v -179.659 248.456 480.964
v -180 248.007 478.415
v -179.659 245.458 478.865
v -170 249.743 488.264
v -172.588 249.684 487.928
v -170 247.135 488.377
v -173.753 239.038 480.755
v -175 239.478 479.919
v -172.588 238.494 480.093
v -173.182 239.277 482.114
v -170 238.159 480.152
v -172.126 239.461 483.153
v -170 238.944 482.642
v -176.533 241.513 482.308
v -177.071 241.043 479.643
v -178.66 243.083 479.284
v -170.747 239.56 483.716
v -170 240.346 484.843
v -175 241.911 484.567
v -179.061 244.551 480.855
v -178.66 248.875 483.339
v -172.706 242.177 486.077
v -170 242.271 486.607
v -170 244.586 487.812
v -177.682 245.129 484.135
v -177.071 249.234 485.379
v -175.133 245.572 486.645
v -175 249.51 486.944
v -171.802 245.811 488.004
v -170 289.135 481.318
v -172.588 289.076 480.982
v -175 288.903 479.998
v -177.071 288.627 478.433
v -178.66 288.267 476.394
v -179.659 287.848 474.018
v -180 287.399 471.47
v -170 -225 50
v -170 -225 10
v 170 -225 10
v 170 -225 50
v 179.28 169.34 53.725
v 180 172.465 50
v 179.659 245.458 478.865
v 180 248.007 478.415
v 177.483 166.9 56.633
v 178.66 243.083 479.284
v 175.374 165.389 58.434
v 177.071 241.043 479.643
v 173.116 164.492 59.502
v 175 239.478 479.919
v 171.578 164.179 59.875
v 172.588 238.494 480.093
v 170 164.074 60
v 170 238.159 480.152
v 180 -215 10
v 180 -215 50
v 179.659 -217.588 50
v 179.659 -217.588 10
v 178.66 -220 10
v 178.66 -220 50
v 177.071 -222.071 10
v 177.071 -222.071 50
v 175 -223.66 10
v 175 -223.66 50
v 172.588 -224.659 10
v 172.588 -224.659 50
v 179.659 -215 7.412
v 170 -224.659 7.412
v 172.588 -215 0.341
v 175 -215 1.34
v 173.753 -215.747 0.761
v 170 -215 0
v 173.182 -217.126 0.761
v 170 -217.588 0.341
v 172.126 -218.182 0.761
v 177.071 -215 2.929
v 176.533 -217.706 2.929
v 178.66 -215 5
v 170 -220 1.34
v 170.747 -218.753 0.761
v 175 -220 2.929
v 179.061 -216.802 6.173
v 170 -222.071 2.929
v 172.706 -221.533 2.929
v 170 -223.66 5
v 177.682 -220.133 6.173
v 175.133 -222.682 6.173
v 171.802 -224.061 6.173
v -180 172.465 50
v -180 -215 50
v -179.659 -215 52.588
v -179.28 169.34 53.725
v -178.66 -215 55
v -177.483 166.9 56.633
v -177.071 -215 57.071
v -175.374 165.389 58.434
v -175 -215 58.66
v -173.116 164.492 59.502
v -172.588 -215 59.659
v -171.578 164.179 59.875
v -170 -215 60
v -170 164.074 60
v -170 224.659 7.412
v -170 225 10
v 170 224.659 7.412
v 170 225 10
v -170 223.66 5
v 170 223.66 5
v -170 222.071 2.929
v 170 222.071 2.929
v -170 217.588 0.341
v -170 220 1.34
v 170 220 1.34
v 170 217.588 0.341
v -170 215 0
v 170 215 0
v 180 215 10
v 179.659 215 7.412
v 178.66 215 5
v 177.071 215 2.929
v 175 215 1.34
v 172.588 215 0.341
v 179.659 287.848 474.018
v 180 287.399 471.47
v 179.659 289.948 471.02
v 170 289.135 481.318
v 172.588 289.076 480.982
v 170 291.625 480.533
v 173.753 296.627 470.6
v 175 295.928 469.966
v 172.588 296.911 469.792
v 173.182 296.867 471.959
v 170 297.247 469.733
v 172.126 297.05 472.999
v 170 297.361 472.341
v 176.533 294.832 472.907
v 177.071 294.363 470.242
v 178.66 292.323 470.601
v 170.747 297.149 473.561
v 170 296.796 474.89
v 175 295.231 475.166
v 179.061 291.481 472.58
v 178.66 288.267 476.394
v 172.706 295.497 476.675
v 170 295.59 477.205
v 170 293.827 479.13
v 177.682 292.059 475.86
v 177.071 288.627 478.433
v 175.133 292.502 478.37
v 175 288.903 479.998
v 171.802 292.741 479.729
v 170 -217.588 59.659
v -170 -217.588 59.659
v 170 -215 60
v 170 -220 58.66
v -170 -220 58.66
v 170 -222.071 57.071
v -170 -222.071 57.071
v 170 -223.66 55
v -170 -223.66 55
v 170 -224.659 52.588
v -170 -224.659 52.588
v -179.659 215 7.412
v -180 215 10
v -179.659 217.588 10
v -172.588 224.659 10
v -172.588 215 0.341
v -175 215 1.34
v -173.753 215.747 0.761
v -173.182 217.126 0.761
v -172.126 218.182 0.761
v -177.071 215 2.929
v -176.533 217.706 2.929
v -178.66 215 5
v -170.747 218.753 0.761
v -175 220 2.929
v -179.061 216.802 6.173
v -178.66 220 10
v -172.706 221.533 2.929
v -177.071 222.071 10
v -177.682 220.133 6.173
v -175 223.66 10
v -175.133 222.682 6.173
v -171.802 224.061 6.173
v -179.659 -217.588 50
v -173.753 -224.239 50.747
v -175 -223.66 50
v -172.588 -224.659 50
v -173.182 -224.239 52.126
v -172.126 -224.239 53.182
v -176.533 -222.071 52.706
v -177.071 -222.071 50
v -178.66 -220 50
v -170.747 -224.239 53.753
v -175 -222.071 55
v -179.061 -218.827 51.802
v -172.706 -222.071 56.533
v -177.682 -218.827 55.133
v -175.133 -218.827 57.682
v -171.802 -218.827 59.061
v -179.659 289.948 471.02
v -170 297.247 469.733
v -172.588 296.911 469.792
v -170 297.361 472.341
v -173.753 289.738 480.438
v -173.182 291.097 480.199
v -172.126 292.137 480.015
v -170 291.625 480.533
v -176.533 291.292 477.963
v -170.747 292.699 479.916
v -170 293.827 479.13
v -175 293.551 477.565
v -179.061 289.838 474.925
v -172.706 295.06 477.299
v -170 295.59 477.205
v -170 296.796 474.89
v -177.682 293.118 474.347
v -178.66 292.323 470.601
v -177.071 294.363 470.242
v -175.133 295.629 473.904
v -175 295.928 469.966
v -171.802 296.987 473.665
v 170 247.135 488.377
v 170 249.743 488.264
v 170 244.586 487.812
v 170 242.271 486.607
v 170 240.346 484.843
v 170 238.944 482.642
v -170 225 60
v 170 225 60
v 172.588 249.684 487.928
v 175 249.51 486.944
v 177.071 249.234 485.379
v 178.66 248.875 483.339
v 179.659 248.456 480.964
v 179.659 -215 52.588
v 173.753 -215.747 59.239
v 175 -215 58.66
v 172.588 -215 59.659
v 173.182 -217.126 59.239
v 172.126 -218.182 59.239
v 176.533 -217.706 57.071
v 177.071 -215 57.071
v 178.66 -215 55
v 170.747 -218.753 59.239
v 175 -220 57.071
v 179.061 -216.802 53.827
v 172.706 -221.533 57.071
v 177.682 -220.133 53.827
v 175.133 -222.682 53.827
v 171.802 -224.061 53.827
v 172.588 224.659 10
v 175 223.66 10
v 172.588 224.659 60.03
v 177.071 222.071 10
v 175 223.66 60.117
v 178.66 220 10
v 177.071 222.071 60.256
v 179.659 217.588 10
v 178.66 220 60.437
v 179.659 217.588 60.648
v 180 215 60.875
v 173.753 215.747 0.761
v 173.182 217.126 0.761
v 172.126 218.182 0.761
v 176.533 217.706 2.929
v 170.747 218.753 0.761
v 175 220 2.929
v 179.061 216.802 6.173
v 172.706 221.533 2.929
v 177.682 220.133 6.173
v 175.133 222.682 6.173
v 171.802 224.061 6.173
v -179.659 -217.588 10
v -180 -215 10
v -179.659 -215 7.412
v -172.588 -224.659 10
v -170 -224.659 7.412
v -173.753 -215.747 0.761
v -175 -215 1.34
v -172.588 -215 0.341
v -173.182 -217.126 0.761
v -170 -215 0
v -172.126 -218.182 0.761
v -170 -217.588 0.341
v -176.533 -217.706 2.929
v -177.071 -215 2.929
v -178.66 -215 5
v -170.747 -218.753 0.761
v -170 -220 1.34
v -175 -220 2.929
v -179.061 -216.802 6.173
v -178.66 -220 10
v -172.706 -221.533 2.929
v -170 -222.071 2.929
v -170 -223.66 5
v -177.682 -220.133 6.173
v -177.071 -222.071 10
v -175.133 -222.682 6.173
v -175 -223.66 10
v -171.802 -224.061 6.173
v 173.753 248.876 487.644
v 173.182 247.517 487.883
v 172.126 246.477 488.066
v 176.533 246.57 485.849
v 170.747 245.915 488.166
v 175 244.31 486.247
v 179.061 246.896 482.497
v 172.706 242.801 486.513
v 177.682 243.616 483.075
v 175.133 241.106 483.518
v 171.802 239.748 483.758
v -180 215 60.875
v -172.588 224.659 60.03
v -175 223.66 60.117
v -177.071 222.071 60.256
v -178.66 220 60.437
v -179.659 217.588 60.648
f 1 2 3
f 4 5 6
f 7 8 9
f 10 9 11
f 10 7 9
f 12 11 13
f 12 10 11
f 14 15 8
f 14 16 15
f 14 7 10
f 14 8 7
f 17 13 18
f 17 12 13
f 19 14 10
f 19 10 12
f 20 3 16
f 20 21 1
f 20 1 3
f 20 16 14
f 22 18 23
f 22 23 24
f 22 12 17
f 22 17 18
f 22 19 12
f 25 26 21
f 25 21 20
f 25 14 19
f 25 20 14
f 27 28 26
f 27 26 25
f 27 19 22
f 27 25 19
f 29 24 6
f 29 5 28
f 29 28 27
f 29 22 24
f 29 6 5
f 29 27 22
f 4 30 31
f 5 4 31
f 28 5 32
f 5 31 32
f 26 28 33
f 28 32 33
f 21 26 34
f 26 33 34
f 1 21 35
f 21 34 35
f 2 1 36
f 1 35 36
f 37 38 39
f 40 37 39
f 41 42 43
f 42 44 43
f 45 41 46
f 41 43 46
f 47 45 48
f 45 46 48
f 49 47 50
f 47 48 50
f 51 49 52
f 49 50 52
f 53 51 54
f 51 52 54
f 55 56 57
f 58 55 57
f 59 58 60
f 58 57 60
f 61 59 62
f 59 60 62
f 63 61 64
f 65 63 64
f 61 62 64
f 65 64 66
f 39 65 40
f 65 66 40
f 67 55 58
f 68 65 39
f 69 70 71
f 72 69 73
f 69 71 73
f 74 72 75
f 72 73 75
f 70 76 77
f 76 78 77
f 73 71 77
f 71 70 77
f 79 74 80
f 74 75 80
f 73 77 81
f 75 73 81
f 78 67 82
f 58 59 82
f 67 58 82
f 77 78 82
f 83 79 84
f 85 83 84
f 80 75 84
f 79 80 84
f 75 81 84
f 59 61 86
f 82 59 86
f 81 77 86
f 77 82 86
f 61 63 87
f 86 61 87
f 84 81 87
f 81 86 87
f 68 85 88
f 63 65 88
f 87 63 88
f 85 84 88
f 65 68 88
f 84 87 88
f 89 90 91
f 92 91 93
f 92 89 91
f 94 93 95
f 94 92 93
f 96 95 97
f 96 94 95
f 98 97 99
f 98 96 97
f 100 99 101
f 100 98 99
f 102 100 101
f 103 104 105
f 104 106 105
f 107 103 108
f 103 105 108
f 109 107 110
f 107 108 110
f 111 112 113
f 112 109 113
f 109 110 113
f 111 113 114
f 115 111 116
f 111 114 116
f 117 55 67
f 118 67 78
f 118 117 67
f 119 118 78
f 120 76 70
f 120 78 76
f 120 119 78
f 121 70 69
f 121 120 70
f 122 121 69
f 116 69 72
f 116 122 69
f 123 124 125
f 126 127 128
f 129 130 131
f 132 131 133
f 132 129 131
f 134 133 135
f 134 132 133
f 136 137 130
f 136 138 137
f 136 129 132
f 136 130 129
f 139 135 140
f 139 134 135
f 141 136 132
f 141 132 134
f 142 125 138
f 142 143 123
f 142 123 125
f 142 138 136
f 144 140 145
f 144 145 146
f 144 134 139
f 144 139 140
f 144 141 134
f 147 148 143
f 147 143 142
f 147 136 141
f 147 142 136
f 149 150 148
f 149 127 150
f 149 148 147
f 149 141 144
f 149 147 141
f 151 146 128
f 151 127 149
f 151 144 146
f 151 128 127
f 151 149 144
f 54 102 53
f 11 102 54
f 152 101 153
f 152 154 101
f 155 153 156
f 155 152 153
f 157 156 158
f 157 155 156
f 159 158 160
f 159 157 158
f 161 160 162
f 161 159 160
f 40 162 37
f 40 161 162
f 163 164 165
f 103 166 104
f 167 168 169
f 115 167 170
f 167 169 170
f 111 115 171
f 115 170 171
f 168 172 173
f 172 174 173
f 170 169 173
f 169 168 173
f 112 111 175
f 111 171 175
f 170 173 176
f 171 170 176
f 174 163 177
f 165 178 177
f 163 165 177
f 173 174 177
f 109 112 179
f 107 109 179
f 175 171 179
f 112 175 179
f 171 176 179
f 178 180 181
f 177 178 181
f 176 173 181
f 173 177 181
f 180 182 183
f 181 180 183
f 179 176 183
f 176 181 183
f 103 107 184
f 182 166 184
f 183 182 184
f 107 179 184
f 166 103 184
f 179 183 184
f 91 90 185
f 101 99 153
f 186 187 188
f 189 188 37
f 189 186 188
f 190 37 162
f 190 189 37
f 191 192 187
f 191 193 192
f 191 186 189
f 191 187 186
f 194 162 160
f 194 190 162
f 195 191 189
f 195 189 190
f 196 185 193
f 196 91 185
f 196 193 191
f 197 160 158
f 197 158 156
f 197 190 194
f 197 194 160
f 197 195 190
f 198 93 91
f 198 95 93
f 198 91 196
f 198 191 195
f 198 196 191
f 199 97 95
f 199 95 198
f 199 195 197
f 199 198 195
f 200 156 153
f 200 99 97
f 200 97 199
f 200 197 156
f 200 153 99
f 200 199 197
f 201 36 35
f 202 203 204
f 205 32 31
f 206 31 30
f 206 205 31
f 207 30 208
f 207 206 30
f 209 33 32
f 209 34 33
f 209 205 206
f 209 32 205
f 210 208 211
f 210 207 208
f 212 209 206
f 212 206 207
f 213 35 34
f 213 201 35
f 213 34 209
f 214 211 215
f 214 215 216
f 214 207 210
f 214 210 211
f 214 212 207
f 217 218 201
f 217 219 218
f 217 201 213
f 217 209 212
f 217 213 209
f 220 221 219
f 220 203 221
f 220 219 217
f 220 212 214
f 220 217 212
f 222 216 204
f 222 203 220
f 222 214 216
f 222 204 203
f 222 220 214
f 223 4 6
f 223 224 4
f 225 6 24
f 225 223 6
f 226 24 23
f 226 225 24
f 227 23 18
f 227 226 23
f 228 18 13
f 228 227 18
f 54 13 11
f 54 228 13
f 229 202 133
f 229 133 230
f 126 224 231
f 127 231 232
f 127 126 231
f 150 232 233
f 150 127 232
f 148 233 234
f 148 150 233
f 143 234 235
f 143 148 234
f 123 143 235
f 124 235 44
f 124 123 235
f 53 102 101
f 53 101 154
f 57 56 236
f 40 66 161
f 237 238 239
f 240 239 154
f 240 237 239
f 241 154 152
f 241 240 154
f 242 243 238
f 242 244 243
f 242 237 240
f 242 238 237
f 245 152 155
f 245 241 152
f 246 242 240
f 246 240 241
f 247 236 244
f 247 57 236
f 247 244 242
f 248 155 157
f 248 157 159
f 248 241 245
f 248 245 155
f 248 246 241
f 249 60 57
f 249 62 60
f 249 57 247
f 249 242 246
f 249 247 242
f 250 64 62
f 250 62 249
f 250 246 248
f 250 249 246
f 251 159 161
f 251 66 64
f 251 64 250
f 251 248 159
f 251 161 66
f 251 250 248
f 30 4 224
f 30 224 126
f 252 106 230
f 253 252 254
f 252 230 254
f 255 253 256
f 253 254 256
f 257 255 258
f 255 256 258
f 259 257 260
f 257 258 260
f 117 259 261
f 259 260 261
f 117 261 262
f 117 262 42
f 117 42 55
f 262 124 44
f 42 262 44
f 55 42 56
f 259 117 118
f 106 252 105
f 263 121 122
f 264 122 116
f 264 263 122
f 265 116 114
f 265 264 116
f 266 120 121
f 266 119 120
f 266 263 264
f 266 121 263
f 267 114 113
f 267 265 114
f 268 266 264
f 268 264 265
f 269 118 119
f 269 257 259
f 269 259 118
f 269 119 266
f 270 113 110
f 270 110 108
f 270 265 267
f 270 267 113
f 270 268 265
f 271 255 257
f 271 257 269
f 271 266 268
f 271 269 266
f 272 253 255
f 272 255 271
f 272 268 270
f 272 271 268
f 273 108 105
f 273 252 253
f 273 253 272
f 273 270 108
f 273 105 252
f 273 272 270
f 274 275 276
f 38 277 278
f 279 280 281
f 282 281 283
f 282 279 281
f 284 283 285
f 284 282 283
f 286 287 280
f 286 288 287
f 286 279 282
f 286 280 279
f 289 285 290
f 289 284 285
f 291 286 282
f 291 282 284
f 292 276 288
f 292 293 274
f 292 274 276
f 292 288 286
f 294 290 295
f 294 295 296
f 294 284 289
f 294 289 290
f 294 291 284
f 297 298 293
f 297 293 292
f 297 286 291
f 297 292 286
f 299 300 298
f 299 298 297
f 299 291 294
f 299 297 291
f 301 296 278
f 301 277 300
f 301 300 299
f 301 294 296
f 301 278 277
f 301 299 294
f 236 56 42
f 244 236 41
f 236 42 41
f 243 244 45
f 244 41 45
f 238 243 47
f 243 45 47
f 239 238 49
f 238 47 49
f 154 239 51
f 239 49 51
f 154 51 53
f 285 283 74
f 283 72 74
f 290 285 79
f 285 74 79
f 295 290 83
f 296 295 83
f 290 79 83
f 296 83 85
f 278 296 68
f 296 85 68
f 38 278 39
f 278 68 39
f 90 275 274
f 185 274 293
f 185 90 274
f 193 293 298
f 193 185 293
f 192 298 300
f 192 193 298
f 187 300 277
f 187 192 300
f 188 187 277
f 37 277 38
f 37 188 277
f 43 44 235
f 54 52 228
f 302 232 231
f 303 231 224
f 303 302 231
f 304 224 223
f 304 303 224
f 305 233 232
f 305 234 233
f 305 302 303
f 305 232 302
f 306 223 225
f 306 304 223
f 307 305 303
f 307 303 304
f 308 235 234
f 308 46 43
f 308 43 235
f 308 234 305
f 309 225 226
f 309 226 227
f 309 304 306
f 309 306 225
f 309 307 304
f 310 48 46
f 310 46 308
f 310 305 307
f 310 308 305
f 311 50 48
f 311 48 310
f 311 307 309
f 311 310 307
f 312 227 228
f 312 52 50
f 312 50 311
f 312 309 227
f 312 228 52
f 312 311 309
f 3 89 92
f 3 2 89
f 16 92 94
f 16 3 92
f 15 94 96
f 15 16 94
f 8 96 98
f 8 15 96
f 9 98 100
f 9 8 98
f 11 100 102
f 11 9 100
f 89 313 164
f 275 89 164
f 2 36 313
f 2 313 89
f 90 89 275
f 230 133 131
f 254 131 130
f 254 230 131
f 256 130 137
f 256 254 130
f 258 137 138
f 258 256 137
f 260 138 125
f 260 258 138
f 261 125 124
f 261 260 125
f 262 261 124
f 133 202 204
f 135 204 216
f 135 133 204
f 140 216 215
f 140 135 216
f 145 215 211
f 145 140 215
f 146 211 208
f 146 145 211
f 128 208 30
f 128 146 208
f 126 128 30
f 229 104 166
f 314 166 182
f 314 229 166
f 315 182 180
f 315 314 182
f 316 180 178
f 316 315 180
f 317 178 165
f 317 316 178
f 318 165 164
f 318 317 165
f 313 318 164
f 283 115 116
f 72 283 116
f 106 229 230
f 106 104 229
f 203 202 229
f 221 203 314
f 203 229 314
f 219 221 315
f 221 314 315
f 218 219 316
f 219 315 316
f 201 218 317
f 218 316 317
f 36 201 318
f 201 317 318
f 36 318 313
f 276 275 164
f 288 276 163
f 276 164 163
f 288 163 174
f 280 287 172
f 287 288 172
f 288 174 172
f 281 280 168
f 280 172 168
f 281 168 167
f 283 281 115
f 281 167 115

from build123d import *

# Parameters (mm, degrees)
F0_W     = 360
F0_H     = 450
F1_DEPTH = 60
F3_DEPTH = 360
F4_R     = 10


with BuildPart() as f1:
    # F0 (on Top) → F1 (new body)
    with BuildSketch(Plane.XY):
        Rectangle(F0_W, F0_H)
    extrude(amount=F1_DEPTH)

    # F2 (on face) → F3 (join, through all)
    with BuildSketch(Plane(origin=(-180, 0, 0), x_dir=(0, -1, 0), z_dir=(-1, 0, 0))):
        Polygon((-298.98347, 479.581109), (-225, 60), (-164.074403, 60), (-239.895005, 490), align=None)
    extrude(amount=-F3_DEPTH)

    # F4
    f4_edges = [f1.edges().sort_by_distance(p)[0] for p in [
        (-180, 225, 30),
        (-180, 261.991735, 269.790555),
        (-180, 269.439238, 484.790555),
        (-180, 201.984704, 275),
        (-180, -30.462798, 60),
        (-180, -225, 30),
        (-180, 0, 0),
        (180, -225, 30),
        (180, -30.462798, 60),
        (180, 201.984704, 275),
        (180, 269.439238, 484.790555),
        (180, 261.991735, 269.790555),
        (180, 225, 30),
        (180, 0, 0),
        (0, -225, 0),
        (0, -225, 60),
        (0, 239.895005, 490),
        (0, 298.98347, 479.581109),
        (0, 225, 0),
    ]]
    fillet(f4_edges, radius=F4_R)


solid = f1.part
